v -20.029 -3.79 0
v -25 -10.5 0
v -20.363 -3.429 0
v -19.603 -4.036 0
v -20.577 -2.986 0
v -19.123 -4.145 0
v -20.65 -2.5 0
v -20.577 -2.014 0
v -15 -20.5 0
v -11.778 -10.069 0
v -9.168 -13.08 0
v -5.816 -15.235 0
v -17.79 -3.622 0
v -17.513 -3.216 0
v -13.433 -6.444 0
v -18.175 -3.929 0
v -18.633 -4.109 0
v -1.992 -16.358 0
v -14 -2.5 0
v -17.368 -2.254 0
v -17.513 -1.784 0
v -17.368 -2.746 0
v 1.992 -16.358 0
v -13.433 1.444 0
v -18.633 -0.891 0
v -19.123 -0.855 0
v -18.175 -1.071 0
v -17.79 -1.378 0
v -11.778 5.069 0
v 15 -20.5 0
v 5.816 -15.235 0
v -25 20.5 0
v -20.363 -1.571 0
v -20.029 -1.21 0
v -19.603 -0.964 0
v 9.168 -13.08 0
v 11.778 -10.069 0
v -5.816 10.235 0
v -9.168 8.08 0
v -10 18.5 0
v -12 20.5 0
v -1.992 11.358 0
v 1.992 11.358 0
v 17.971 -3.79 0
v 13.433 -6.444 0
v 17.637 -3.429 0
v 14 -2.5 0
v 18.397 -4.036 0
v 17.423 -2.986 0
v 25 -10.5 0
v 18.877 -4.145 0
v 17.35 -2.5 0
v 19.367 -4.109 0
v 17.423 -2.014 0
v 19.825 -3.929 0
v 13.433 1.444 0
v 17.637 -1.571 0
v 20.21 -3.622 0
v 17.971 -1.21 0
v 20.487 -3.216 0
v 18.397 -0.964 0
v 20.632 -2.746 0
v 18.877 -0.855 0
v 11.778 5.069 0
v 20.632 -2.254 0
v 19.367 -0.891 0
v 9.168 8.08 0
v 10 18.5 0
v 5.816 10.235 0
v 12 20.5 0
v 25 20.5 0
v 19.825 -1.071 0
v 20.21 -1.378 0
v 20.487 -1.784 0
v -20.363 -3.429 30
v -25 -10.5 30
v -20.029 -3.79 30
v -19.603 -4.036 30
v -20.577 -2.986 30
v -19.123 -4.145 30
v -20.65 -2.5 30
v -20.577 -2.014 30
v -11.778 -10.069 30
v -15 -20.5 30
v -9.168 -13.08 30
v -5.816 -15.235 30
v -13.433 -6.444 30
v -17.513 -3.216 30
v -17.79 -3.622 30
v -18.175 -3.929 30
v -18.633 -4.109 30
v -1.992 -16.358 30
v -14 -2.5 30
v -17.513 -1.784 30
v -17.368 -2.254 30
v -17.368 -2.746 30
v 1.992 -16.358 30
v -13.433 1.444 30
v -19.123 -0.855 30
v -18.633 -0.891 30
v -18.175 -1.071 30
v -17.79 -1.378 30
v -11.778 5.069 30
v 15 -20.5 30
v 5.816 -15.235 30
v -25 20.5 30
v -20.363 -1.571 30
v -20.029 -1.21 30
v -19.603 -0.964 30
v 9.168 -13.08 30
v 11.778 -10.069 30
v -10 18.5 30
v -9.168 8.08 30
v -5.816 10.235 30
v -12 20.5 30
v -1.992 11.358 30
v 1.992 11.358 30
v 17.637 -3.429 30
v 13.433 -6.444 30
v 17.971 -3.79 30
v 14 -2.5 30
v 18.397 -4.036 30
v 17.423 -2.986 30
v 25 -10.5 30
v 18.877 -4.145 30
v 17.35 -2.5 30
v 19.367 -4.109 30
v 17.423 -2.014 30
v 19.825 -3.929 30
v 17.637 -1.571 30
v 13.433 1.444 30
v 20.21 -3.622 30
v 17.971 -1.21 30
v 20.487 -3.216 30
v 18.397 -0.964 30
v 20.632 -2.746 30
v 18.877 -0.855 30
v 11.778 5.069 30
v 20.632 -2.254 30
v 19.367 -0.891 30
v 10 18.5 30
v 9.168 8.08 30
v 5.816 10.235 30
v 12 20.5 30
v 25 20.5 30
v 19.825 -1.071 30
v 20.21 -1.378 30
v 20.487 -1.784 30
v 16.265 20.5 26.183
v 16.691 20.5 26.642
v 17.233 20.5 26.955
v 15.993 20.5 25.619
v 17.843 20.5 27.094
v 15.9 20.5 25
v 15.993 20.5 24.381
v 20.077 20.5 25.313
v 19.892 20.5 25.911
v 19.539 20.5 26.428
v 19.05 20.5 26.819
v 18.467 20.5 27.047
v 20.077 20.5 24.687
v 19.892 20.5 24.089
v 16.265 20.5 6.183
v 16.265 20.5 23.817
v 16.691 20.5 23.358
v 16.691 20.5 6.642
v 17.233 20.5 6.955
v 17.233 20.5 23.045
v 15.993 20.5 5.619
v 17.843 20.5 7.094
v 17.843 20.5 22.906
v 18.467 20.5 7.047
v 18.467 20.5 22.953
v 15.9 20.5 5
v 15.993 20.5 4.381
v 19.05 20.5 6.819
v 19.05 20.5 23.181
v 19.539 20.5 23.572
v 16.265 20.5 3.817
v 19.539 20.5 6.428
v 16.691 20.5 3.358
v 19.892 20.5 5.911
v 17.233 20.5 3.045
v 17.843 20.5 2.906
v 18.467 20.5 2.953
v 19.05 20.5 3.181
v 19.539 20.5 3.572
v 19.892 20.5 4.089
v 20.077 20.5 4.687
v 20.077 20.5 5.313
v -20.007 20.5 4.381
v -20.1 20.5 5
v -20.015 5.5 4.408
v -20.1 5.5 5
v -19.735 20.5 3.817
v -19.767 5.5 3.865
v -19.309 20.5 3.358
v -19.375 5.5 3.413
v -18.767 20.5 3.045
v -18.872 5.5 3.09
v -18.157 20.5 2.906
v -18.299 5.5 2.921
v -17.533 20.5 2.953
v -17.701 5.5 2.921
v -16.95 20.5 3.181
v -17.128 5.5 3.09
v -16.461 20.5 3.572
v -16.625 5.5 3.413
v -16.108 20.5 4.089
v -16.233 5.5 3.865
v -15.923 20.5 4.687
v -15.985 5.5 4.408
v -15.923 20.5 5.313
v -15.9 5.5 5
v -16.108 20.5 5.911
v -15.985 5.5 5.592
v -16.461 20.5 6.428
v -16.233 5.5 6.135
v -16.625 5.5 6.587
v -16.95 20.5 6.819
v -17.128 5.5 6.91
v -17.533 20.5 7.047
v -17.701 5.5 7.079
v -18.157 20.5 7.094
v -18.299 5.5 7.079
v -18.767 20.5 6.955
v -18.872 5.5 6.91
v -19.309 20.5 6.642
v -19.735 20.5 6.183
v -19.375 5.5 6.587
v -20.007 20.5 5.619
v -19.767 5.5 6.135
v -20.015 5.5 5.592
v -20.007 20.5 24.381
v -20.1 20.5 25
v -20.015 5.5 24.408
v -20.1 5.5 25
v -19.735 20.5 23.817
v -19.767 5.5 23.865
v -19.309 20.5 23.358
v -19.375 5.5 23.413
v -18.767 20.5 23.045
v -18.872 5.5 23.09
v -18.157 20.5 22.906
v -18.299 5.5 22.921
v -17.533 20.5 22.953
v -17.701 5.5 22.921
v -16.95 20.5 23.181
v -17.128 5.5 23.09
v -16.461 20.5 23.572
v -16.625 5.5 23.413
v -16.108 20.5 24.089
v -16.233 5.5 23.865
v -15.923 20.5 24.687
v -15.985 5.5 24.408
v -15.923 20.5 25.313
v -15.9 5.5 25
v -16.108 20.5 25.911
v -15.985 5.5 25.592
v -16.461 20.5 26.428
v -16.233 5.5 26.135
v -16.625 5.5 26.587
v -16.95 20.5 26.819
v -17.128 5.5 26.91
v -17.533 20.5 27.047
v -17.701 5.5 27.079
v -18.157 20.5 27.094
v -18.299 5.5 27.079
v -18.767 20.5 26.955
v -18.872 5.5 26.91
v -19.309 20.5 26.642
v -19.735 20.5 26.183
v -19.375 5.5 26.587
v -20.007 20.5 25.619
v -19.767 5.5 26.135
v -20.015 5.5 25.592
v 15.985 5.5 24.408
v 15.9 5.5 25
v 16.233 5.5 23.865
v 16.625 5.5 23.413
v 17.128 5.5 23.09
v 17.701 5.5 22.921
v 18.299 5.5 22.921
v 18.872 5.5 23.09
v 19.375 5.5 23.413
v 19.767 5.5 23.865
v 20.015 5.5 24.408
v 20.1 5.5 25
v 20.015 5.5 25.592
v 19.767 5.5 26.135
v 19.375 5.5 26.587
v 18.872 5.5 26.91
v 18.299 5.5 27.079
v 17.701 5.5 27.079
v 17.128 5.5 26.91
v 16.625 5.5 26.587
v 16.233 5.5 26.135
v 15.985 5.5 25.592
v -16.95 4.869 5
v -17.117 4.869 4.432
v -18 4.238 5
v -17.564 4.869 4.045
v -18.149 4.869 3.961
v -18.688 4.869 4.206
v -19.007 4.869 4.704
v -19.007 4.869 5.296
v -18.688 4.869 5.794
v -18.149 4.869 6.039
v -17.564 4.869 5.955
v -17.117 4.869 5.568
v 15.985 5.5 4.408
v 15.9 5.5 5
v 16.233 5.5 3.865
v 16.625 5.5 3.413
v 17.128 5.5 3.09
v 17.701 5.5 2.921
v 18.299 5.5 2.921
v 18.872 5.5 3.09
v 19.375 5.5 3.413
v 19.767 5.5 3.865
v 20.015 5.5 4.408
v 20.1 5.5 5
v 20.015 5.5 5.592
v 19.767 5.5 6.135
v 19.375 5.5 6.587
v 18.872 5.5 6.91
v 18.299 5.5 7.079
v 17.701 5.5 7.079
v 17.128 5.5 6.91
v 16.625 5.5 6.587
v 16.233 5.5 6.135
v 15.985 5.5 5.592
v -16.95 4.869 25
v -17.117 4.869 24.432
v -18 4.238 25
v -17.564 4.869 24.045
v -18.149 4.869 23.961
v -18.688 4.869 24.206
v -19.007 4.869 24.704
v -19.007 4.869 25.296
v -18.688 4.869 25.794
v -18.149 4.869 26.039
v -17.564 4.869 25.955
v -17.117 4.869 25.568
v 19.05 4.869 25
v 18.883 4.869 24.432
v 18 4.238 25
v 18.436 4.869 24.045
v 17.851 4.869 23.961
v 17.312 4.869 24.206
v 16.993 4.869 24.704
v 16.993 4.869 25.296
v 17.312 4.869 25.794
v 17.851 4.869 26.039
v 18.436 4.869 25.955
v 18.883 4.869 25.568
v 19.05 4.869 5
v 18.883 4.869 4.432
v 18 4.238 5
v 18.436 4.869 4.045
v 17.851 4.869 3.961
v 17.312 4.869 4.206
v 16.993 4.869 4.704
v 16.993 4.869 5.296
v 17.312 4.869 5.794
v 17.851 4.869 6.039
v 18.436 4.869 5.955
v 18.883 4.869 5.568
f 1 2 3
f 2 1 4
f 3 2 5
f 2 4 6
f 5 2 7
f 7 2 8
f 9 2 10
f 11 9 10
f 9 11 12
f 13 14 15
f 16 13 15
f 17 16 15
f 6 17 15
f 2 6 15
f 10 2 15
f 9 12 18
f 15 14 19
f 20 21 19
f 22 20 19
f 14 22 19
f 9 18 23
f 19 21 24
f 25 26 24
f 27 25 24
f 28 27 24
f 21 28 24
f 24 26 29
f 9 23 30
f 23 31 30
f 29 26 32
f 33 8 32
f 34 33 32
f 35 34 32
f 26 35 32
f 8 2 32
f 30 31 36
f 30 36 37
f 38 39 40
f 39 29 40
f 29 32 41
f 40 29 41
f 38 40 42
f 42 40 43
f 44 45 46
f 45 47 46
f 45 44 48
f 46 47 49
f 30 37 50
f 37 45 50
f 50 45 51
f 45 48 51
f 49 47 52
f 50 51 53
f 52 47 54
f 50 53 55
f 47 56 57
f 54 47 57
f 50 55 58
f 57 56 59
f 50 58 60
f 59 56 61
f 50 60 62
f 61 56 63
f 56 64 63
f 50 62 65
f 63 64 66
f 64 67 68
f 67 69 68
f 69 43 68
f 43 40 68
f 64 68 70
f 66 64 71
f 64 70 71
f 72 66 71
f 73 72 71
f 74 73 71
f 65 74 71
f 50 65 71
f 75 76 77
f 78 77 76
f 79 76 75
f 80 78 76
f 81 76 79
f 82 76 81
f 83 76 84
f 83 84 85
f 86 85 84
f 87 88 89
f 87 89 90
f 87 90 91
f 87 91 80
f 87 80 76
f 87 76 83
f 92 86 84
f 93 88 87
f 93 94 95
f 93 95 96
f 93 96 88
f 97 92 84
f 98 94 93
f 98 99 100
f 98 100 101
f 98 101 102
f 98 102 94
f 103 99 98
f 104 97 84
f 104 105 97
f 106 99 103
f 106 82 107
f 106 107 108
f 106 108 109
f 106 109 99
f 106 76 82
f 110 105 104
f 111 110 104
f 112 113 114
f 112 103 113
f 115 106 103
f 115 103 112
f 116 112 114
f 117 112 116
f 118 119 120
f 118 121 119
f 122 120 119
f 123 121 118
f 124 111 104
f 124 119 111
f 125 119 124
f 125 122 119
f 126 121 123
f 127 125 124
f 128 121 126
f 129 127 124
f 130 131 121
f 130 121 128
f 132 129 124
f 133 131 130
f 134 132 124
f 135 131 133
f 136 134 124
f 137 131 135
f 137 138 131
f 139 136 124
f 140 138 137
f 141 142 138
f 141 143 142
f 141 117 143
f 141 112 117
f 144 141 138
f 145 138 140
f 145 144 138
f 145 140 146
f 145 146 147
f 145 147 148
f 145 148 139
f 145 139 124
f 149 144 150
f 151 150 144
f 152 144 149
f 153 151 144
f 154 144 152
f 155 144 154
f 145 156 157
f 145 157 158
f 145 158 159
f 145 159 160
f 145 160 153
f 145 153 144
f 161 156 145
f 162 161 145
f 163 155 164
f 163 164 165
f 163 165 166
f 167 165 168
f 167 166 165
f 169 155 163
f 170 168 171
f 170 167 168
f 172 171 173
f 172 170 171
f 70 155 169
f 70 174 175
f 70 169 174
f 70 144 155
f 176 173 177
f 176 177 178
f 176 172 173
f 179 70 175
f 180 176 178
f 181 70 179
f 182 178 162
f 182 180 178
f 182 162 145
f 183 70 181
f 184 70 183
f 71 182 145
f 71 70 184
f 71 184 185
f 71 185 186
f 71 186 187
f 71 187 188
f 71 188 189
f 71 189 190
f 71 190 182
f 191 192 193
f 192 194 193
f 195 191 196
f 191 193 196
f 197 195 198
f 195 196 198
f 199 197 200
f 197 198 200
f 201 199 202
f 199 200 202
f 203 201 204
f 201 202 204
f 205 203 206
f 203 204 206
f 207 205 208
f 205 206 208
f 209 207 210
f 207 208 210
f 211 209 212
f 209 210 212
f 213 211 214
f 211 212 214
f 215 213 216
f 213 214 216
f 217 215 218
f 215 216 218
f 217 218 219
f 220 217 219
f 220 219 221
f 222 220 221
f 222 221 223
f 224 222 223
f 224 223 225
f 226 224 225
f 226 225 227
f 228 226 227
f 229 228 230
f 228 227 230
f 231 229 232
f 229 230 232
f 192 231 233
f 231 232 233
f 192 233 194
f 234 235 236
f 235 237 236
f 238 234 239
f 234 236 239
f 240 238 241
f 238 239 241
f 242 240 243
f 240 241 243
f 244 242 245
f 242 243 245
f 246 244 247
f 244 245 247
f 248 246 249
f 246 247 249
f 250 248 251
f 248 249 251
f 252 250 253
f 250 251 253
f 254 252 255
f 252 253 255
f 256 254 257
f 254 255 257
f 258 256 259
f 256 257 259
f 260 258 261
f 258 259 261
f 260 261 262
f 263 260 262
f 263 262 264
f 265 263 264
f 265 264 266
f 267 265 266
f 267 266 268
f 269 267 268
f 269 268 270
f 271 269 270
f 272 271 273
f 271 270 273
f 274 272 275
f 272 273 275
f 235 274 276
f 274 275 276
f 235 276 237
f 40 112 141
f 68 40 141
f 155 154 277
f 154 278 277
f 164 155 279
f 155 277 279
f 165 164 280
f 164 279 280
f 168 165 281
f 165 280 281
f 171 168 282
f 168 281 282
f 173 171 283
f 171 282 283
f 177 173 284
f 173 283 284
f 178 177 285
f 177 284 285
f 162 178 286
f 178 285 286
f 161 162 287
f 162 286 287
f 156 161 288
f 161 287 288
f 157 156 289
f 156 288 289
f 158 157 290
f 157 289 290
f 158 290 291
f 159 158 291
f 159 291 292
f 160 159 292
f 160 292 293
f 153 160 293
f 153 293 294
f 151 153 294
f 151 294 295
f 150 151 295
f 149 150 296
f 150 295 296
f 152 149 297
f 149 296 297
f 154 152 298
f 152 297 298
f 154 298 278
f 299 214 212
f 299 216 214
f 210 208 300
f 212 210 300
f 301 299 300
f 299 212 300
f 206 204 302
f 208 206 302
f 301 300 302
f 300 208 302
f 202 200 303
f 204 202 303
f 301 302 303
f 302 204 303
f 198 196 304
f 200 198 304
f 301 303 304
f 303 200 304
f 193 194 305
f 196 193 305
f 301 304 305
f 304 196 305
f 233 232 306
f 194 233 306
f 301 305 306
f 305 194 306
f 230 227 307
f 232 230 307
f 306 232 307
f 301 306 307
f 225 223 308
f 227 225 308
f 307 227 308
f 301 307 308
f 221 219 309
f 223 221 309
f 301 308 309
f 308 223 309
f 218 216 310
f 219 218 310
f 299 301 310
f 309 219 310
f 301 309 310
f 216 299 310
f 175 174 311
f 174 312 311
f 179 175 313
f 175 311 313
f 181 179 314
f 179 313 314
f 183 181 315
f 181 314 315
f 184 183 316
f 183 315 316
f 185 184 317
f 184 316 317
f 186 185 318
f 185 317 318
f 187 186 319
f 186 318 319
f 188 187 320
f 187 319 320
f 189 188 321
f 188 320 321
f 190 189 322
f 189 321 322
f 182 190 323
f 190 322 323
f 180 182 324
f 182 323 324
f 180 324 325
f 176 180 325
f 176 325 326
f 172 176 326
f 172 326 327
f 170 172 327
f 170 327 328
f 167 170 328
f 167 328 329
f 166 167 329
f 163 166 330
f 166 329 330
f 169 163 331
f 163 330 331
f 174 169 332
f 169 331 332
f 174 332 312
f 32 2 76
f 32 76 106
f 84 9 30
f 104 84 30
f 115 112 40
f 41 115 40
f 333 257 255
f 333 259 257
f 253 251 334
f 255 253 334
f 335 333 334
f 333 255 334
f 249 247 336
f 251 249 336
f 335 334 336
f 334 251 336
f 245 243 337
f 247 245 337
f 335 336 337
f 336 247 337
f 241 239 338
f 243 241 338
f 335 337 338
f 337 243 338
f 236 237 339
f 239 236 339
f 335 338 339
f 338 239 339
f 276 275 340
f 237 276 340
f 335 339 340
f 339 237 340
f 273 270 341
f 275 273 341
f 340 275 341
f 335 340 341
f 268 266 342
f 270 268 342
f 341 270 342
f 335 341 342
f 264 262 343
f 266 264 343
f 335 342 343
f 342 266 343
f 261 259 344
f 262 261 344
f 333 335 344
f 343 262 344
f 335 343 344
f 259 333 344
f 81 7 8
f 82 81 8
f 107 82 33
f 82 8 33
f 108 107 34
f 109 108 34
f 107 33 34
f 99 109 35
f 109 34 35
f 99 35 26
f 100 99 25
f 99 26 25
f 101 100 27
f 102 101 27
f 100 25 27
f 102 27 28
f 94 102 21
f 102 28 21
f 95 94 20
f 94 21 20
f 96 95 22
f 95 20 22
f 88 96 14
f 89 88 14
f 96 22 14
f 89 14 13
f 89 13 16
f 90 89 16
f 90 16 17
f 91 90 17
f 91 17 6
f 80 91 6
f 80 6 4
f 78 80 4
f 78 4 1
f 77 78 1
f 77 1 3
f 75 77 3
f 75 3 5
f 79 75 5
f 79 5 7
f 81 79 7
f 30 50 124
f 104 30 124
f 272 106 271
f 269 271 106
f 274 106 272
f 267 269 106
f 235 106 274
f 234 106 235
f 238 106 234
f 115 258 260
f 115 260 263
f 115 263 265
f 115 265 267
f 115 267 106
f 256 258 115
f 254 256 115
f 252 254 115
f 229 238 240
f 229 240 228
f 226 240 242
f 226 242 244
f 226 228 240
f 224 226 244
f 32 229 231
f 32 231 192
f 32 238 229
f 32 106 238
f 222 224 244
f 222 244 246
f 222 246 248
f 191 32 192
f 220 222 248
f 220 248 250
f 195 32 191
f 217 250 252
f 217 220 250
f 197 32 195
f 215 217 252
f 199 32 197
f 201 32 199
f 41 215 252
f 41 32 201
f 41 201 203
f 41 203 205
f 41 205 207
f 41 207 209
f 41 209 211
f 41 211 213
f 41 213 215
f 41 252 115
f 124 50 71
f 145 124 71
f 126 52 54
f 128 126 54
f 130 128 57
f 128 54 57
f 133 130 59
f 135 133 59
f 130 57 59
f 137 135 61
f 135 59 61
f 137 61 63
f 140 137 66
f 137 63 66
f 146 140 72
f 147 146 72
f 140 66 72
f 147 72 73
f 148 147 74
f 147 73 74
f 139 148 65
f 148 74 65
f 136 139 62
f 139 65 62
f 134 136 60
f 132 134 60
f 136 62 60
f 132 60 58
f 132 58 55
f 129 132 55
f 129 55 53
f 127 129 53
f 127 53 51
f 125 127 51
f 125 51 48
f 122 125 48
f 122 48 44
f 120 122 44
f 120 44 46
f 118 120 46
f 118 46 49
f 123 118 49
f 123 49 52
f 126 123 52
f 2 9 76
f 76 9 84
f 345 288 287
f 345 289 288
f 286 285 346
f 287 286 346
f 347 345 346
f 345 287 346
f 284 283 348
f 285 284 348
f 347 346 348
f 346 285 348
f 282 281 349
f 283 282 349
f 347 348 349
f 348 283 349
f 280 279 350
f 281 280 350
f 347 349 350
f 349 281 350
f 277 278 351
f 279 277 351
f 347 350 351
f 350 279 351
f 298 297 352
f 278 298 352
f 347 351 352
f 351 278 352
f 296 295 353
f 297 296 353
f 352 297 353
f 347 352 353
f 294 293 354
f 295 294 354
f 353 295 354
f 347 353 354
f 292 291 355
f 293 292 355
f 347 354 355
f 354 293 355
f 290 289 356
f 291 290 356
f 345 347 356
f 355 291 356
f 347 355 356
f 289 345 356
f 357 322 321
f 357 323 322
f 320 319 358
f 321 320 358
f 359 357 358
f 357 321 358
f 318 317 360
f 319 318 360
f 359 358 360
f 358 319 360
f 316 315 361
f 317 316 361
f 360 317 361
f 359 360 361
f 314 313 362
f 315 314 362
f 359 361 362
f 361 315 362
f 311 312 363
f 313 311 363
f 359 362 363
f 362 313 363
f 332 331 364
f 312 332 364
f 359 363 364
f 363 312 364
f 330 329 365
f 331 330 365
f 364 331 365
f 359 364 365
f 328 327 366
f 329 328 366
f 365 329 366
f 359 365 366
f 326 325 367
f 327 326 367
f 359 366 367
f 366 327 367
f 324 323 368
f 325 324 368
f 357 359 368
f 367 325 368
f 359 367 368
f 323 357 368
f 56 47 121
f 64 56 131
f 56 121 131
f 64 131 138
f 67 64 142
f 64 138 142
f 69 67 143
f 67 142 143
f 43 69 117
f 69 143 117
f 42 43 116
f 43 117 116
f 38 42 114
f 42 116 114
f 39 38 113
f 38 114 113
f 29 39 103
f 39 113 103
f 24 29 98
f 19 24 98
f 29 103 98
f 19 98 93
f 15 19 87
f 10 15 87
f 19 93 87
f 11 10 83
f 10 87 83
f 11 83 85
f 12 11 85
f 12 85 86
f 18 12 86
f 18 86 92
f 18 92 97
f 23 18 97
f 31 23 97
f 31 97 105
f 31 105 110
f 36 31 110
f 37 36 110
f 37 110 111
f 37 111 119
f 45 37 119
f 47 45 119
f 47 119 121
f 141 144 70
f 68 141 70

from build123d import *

# Parameters (mm, degrees)
SKETCH1_W                   = 50
SKETCH1_H                   = 41
BOSS_EXTRUDE1_DEPTH         = 30
SKETCH8_R                   = 14
SKETCH8_W                   = 24
SKETCH8_H                   = 4
CUT_EXTRUDE1_DEPTH          = 45.10498838
TAP_DRILL_FOR_M4_TAP1_D     = 3.3
TAP_DRILL_FOR_M5_TAP2_D     = 4.2
TAP_DRILL_FOR_M5_TAP2_DEPTH = 15
TAP_DRILL_FOR_M5_TAP2_TIP   = 1.2618073
CHAMFER1_SIZE               = 2
CHAMFER2_SIZE               = 10


with BuildPart() as part:
    # Sketch1 → Boss-Extrude1 (new body)
    with BuildSketch(Plane.XY):
        Rectangle(SKETCH1_W, SKETCH1_H)
    extrude(amount=BOSS_EXTRUDE1_DEPTH)

    # Sketch8 → Cut-Extrude1 (cut, through all)
    with BuildSketch(Plane.XY.offset(30)):
        with Locations((0, -2.5)):
            Circle(SKETCH8_R)
        with Locations((0, 20.5)):
            Rectangle(SKETCH8_W, SKETCH8_H)
    extrude(amount=-CUT_EXTRUDE1_DEPTH, mode=Mode.SUBTRACT)

    # Tap Drill for M4 Tap1 (through all)
    with Locations(Plane.XY.offset(30)):
        with Locations((19, -2.5), (-19, -2.5)):
            Hole(TAP_DRILL_FOR_M4_TAP1_D / 2)

    # Tap Drill for M5 Tap2
    with Locations(Plane(origin=(0, 20.5, 0), x_dir=(1, 0, 0), z_dir=(0, 1, 0))):
        with Locations((-18, -25), (-18, -5), (18, -5), (18, -25)):
            Hole(TAP_DRILL_FOR_M5_TAP2_D / 2, depth=TAP_DRILL_FOR_M5_TAP2_DEPTH)
            with Locations((0, 0, -(TAP_DRILL_FOR_M5_TAP2_DEPTH + TAP_DRILL_FOR_M5_TAP2_TIP / 2))):  # 118° drill point
                Cone(0, TAP_DRILL_FOR_M5_TAP2_D / 2, TAP_DRILL_FOR_M5_TAP2_TIP, mode=Mode.SUBTRACT)

    # Chamfer1
    chamfer1_edges = [part.edges().sort_by_distance(p)[0] for p in [
        (12, 18.5, 15),
        (-12, 18.5, 15),
    ]]
    chamfer(chamfer1_edges, length=CHAMFER1_SIZE - 0.0001)  # a hair under: the kernel refuses the full size

    # Chamfer2
    chamfer2_edges = [part.edges().sort_by_distance(p)[0] for p in [
        (25, -20.5, 15),
        (-25, -20.5, 15),
    ]]
    chamfer(chamfer2_edges, length=CHAMFER2_SIZE)


solid = part.part
